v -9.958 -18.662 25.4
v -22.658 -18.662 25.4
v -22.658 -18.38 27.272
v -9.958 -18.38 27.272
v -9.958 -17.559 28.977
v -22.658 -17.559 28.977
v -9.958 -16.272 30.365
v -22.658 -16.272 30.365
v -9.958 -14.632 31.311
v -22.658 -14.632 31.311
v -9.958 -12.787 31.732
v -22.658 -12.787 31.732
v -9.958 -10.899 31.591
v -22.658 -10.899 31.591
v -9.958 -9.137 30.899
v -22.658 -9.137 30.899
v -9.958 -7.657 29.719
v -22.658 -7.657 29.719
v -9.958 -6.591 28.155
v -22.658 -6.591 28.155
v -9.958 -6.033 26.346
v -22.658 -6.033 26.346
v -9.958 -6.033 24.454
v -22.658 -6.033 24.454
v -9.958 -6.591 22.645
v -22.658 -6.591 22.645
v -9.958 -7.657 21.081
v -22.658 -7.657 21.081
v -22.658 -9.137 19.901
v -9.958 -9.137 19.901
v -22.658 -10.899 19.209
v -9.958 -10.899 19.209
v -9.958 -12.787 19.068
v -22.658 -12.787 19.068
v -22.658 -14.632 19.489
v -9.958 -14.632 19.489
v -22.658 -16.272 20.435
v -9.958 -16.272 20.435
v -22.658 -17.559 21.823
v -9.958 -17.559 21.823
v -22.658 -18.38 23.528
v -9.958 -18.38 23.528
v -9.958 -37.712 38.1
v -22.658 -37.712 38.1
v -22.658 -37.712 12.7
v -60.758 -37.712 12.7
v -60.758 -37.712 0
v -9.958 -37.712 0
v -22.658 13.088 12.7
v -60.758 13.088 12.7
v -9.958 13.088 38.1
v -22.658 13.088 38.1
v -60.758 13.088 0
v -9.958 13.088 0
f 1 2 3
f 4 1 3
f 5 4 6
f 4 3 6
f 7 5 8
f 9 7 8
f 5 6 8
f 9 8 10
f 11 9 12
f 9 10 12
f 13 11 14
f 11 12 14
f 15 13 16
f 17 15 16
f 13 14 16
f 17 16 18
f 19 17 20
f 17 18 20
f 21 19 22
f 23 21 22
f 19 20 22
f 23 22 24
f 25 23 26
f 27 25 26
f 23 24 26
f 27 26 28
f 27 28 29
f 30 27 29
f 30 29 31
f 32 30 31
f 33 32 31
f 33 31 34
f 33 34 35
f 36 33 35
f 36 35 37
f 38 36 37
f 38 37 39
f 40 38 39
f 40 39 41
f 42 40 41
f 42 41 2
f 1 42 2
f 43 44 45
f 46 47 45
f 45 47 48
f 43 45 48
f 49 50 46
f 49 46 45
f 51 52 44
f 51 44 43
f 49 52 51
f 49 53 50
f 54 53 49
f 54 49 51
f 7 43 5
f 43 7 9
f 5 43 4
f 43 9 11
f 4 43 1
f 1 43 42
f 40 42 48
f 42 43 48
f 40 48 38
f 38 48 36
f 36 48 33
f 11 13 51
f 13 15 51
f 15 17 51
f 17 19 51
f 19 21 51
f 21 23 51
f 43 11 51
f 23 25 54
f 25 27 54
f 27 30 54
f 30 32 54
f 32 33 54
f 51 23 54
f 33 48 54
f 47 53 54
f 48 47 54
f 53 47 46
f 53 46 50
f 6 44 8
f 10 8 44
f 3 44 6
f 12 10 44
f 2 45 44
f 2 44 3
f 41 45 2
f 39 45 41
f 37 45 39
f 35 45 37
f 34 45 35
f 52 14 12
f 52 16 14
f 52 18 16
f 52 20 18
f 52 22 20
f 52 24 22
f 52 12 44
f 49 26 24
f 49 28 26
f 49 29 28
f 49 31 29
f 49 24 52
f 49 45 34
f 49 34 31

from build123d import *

# Parameters (mm, degrees)
F0_W     = 50.8
F0_H     = 50.8
F1_DEPTH = 12.7
F2_W     = 12.7
F2_H     = 50.8
F3_DEPTH = 25.4
F4_R     = 6.35
F5_DEPTH = 12.701


with BuildPart() as f1:
    # F0 (on Top) → F1 (new body)
    with BuildSketch(Plane.XY):
        with Locations((-35.357555, -12.31235)):
            Rectangle(F0_W, F0_H)
    extrude(amount=F1_DEPTH)

    # F2 (on face) → F3 (join)
    with BuildSketch(Plane.XY.offset(12.7)):
        with Locations((-16.307555, -12.31235)):
            Rectangle(F2_W, F2_H)
    extrude(amount=F3_DEPTH)

    # F4 (on face) → F5 (cut, through all)
    with BuildSketch(Plane(origin=(-22.657555, 0, 0), x_dir=(0, -1, 0), z_dir=(-1, 0, 0))):
        with Locations((12.31235, 25.4)):
            Circle(F4_R)
    extrude(amount=-F5_DEPTH, mode=Mode.SUBTRACT)


solid = f1.part
